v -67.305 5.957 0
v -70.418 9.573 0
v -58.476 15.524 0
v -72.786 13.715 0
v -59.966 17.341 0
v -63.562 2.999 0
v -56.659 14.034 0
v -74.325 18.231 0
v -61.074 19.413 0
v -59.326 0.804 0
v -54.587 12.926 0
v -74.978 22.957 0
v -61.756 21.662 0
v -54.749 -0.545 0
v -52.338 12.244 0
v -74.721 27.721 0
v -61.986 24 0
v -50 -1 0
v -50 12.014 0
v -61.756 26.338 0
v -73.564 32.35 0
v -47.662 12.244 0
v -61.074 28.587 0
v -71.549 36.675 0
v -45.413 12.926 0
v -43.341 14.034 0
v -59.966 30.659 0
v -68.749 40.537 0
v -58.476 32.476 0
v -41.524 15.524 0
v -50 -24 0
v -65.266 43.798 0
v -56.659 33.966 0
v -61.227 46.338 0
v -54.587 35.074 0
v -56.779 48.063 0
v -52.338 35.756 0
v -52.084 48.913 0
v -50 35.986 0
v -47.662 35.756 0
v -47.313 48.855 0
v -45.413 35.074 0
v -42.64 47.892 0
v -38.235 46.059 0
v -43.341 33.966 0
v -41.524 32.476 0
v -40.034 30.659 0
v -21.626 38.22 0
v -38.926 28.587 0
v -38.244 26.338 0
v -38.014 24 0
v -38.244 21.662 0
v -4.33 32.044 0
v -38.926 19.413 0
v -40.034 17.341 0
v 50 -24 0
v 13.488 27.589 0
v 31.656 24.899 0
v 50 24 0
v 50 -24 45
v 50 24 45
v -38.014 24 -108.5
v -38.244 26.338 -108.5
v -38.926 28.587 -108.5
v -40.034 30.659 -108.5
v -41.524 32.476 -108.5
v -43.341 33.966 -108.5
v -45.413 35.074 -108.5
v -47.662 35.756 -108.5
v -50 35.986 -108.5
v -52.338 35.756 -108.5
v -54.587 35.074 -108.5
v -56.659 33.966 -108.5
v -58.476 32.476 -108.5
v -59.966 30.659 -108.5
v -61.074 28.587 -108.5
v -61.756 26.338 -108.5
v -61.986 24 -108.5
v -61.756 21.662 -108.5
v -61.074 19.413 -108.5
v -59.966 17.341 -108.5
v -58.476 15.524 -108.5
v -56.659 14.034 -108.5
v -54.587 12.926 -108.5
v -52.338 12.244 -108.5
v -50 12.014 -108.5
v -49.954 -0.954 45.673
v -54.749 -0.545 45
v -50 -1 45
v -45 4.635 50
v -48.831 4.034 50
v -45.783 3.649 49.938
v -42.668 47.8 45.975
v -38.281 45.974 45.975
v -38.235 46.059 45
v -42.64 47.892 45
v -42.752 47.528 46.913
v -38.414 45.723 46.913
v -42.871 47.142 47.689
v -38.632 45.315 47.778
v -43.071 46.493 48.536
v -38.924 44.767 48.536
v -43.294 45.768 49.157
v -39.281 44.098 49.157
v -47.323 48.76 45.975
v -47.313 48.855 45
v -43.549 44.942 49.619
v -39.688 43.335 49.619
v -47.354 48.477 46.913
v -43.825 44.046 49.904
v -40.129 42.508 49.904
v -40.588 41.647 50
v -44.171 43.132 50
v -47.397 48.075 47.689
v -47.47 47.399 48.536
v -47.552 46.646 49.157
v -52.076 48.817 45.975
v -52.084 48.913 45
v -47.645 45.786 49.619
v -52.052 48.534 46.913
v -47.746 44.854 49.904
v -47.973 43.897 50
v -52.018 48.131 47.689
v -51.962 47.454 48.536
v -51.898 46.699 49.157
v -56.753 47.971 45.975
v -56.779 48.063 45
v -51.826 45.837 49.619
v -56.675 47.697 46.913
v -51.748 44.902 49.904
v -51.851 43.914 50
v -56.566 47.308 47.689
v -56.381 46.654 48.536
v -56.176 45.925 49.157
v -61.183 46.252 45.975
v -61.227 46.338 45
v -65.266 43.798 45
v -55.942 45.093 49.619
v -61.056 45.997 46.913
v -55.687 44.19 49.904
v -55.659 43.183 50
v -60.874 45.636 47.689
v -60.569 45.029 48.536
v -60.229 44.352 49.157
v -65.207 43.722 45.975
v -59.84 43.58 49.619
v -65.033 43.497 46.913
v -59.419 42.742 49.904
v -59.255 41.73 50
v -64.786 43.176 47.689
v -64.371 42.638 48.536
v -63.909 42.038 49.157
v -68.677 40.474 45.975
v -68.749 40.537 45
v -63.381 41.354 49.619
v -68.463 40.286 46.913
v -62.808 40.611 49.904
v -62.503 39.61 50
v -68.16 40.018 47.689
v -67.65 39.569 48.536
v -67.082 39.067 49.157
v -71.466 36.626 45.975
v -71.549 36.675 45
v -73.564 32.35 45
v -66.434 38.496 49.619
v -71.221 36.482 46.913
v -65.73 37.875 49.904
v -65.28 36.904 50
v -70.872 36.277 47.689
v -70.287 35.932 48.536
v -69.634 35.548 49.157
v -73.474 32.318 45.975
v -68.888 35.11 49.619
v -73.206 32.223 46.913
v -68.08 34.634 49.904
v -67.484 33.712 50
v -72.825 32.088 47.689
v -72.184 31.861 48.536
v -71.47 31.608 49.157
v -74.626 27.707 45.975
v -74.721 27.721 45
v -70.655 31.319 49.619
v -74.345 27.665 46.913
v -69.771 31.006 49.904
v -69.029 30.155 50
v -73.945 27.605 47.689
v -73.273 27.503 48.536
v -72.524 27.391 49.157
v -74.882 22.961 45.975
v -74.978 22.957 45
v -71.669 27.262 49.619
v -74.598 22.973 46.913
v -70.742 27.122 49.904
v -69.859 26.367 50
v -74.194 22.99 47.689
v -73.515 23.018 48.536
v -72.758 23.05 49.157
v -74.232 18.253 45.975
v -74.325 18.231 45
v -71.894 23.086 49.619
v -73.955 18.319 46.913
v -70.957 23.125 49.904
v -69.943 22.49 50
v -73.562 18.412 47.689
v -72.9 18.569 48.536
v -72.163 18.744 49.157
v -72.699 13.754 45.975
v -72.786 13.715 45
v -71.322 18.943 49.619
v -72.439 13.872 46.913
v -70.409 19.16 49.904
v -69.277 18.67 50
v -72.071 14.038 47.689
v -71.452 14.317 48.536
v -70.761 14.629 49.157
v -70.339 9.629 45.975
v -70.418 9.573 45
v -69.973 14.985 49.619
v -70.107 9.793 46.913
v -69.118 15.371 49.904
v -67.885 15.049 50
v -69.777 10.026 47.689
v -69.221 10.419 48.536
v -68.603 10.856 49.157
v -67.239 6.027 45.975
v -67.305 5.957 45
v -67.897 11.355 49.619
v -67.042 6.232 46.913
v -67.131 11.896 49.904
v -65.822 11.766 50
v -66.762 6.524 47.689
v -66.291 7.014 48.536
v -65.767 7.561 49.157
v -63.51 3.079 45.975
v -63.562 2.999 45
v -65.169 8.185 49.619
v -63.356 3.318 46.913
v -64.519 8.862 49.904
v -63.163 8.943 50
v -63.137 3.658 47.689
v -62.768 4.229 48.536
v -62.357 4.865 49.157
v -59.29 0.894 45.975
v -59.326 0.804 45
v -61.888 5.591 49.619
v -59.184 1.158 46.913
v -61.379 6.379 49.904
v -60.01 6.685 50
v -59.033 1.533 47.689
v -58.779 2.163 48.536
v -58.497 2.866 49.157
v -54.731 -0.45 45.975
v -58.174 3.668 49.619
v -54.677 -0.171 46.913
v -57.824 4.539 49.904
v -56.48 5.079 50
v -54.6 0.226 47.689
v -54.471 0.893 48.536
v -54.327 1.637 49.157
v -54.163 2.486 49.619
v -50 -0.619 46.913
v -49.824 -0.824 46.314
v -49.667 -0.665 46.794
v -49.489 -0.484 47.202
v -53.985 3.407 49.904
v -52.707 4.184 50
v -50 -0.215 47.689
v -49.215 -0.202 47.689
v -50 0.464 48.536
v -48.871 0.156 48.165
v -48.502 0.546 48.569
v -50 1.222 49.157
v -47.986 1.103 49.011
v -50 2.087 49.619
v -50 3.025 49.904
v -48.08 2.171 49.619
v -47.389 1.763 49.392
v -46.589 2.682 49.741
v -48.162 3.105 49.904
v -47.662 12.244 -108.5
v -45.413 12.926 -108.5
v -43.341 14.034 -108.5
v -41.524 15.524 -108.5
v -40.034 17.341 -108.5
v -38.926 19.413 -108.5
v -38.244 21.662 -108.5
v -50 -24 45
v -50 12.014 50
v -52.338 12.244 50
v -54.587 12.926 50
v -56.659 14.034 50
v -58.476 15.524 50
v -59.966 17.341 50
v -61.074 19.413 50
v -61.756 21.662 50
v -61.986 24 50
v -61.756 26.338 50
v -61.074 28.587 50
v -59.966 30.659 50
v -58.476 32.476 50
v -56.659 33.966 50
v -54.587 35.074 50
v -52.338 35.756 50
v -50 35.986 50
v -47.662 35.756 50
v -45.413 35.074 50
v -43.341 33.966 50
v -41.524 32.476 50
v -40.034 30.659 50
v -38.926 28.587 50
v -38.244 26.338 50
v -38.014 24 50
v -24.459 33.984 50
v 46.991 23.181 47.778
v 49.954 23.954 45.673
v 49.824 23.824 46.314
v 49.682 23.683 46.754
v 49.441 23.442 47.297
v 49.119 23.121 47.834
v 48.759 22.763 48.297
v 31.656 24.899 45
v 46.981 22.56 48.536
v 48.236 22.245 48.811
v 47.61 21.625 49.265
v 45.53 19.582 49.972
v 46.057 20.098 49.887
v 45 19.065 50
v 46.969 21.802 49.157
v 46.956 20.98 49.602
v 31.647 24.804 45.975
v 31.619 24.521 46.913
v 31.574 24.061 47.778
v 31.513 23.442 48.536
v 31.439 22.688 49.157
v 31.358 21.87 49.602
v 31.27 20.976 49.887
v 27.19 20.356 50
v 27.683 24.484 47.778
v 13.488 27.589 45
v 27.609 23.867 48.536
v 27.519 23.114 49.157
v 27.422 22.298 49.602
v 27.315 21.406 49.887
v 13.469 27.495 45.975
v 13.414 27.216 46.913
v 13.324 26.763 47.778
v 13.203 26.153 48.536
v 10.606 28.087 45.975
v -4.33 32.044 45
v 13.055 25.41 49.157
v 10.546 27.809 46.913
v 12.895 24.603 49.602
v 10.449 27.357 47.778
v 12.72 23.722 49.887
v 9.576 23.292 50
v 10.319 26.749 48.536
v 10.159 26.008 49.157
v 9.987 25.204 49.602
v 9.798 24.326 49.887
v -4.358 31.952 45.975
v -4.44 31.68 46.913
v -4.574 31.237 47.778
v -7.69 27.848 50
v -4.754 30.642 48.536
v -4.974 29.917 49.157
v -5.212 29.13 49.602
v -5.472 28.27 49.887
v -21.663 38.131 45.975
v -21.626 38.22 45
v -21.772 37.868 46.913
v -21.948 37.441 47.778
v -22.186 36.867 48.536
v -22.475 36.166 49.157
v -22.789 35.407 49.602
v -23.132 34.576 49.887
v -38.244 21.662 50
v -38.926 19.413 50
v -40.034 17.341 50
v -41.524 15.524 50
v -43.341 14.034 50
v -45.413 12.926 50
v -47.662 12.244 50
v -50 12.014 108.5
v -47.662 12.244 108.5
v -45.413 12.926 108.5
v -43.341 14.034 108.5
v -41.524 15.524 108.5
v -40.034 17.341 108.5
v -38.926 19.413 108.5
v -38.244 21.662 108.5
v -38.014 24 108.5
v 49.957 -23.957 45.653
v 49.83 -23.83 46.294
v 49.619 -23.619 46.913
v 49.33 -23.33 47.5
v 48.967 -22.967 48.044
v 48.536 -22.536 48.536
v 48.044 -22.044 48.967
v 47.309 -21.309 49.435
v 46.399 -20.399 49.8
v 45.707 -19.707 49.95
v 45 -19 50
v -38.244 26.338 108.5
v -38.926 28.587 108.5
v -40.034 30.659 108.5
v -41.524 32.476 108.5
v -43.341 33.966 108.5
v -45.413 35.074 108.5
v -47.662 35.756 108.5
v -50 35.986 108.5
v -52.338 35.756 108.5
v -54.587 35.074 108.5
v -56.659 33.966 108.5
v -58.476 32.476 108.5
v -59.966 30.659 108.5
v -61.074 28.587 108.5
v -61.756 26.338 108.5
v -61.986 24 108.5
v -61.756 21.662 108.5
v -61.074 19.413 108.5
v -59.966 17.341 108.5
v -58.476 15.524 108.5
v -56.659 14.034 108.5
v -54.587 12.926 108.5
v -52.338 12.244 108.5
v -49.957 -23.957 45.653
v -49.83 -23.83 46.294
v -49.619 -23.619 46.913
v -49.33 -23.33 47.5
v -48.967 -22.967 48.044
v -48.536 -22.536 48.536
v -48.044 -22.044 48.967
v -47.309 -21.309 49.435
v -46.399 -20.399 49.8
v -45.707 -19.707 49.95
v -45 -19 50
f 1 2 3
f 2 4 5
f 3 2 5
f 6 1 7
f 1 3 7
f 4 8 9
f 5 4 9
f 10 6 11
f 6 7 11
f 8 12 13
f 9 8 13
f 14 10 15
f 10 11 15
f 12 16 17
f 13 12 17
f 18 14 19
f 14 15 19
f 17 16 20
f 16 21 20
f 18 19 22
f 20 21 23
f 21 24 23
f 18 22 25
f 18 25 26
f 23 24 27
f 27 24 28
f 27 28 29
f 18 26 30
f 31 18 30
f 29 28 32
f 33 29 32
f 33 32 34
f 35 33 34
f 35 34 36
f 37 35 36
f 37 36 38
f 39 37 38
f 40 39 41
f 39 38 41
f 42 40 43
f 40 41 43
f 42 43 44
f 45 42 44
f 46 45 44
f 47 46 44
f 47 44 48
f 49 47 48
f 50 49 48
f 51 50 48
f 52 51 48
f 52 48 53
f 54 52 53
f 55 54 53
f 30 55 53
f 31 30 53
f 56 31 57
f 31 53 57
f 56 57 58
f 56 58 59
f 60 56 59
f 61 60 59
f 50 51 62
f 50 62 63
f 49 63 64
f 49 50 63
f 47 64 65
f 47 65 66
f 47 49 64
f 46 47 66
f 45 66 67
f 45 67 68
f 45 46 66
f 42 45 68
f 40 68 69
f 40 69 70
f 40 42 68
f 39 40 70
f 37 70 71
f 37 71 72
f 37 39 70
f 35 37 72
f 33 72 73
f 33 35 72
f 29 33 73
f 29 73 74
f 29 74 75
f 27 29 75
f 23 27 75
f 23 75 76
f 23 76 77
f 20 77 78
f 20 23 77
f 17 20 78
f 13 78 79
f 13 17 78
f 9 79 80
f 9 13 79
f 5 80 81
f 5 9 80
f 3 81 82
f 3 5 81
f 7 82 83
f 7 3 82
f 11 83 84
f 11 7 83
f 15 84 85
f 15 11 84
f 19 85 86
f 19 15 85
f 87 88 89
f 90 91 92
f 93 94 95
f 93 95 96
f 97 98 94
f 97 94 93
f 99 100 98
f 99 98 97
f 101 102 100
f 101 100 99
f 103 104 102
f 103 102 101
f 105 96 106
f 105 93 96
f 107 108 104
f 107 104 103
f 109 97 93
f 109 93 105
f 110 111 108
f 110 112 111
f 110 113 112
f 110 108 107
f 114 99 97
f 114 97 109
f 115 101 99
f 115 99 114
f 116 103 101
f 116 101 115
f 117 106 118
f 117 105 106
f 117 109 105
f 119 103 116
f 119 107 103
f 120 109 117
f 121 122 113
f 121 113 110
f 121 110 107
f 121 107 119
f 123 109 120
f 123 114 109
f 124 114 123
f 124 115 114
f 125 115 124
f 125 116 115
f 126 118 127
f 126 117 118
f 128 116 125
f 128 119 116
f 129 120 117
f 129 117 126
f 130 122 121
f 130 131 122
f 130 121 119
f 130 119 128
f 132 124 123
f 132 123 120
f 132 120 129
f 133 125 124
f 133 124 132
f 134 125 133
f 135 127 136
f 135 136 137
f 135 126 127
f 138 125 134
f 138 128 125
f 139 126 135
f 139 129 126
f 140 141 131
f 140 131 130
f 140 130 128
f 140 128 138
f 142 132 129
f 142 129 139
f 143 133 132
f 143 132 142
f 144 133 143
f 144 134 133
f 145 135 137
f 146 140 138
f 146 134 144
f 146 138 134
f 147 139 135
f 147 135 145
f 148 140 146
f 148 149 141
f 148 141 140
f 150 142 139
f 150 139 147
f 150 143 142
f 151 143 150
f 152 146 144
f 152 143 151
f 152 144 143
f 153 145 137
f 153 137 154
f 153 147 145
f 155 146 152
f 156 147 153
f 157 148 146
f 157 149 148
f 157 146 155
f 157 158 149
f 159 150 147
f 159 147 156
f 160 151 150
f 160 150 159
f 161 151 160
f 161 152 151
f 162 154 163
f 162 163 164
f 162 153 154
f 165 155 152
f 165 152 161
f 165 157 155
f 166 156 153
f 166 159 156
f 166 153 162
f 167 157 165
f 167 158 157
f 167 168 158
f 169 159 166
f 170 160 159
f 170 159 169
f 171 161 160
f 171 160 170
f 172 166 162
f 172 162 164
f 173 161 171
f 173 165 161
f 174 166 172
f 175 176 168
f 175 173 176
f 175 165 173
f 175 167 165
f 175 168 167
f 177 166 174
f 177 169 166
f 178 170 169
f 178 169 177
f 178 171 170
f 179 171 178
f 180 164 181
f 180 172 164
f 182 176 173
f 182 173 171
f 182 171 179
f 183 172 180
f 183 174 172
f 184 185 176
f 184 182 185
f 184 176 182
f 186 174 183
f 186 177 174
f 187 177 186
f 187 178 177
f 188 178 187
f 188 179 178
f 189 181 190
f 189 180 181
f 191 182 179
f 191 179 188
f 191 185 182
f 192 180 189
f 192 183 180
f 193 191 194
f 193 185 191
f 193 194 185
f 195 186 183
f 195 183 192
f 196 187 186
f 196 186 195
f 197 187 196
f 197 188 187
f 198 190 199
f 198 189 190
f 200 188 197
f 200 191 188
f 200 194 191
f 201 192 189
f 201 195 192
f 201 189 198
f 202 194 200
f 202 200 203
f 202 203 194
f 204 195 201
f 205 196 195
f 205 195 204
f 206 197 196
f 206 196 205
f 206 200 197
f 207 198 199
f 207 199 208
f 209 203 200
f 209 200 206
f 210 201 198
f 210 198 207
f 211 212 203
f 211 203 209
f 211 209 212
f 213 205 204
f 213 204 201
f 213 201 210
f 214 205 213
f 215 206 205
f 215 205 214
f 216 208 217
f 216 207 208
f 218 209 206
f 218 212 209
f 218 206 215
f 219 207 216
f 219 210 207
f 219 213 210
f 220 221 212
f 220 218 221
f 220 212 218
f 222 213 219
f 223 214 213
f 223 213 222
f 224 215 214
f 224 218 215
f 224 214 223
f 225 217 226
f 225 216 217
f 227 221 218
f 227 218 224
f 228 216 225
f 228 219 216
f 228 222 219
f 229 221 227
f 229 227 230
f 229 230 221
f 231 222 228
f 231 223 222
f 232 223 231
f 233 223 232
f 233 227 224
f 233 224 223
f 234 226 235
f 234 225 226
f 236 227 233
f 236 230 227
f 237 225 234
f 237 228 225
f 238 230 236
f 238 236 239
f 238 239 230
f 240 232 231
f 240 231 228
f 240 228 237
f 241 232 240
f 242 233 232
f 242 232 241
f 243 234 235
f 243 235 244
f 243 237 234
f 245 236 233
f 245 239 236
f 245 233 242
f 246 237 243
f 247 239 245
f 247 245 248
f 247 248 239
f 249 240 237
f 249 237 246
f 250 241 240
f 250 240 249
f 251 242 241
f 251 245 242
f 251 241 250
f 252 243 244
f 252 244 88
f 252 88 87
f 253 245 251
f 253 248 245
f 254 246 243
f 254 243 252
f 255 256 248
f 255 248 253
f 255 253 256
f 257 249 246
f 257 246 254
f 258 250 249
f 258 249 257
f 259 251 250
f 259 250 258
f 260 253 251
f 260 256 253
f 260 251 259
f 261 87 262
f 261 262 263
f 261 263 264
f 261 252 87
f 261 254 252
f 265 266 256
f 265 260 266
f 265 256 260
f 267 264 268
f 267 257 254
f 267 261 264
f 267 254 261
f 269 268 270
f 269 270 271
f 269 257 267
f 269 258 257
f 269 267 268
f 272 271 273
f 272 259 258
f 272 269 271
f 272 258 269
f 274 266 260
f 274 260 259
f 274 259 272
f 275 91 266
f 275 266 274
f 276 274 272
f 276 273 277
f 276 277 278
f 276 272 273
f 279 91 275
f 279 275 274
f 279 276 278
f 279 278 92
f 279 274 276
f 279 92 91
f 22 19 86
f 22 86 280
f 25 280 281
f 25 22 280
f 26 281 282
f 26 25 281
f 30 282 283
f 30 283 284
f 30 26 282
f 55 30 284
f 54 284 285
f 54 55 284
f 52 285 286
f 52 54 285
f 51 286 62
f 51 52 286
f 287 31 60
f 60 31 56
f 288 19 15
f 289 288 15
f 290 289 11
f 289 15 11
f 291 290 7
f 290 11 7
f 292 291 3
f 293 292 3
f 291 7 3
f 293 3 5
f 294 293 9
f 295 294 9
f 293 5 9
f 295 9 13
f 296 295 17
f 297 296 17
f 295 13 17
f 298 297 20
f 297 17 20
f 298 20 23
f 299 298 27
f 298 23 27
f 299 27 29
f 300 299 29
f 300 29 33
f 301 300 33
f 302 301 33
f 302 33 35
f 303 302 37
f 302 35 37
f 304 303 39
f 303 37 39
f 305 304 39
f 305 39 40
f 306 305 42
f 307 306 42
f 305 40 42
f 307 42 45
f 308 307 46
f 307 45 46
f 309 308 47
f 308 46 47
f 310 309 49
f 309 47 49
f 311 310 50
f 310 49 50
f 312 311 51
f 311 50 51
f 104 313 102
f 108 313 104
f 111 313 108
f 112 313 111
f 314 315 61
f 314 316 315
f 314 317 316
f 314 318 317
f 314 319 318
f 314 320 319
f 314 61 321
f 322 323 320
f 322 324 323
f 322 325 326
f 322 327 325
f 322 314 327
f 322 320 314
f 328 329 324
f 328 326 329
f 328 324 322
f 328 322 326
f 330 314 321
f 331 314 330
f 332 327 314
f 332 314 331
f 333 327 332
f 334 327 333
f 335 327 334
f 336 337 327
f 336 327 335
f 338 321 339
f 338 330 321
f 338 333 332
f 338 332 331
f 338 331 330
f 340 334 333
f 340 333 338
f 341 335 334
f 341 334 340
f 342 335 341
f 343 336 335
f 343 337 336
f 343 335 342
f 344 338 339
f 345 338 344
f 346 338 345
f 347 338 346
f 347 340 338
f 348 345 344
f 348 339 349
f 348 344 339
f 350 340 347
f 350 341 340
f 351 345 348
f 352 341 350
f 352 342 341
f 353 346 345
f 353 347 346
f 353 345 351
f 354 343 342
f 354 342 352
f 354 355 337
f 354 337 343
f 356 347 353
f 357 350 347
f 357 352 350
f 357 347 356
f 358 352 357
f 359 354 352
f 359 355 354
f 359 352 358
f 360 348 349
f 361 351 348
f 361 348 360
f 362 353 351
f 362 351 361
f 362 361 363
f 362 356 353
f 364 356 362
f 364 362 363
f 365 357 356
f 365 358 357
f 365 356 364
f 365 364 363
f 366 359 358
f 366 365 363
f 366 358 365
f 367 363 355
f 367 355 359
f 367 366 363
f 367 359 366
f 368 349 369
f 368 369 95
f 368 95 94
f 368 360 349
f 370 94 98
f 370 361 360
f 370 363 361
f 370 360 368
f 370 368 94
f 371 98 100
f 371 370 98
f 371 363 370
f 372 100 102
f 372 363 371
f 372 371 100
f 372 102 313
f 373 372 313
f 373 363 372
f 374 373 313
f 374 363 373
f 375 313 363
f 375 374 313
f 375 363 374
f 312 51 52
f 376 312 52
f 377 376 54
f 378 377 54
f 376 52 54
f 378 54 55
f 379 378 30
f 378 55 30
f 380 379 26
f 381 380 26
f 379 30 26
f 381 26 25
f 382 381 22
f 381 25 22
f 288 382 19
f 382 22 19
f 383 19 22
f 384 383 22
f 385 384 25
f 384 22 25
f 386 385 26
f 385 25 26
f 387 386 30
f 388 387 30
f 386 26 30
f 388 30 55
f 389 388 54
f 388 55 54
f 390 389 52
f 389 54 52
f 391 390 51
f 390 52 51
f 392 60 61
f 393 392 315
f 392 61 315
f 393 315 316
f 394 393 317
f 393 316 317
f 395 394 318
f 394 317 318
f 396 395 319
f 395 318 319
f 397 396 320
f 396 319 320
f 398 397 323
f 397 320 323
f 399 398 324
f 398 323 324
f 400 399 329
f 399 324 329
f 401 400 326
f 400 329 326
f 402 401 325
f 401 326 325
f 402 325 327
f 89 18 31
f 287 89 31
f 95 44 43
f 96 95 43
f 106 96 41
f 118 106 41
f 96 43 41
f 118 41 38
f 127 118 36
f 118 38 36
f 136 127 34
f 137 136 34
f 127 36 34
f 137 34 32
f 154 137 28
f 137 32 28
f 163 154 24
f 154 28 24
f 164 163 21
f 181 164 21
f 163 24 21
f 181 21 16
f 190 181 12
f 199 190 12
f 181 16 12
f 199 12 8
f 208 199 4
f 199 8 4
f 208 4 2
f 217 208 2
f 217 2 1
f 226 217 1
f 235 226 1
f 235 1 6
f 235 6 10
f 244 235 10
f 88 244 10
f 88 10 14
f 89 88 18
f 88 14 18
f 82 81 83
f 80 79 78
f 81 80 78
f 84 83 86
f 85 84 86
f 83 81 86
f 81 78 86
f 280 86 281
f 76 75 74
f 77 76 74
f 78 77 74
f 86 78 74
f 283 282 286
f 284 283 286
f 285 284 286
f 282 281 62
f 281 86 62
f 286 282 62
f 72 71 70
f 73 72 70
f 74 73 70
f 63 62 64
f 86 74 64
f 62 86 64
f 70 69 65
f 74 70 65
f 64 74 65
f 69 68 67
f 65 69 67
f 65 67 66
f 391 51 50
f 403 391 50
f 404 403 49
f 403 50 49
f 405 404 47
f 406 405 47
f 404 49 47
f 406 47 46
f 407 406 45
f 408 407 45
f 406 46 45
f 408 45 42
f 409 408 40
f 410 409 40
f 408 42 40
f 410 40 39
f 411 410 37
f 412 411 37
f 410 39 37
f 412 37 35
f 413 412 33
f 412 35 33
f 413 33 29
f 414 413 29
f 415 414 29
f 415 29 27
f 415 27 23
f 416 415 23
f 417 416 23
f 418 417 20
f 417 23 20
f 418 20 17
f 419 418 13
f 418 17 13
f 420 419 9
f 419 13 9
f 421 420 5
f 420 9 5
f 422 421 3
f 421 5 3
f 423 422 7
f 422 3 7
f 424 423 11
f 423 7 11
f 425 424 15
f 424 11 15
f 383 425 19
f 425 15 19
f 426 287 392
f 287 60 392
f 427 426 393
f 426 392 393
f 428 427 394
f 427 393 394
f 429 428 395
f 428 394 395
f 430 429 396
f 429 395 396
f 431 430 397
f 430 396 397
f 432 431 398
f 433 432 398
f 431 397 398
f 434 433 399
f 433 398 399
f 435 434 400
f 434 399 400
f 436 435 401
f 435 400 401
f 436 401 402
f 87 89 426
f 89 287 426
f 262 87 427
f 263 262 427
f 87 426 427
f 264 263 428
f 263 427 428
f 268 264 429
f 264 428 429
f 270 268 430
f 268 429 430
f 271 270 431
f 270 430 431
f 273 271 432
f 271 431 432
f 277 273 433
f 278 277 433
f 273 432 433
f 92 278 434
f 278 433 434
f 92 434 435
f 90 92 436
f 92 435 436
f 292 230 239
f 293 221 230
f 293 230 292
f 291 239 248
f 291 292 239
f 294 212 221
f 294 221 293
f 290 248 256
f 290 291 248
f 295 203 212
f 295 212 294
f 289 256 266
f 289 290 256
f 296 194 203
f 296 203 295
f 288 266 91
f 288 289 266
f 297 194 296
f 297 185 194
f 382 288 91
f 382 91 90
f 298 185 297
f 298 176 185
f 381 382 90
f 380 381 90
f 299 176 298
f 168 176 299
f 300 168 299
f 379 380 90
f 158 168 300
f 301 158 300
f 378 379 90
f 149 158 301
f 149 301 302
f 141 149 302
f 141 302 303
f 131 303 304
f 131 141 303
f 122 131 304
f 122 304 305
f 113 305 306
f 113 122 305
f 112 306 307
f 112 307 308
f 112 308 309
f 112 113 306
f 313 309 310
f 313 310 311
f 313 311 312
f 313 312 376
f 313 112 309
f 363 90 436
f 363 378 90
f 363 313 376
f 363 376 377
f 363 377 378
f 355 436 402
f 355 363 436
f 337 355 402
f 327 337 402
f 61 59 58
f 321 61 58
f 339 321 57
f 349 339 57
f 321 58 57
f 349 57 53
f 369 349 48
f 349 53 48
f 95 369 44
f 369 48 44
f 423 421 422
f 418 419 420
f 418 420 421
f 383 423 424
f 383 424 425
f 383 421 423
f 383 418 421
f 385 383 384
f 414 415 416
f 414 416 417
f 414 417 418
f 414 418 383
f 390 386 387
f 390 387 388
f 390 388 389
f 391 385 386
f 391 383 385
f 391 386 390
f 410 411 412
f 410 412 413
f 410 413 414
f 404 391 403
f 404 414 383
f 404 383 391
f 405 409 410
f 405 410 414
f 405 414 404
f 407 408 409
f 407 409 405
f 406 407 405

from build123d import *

# Parameters (mm, degrees)
F1_DEPTH = 50
F2_DEPTH = 108.5
F3_R     = 5


with BuildPart() as f1:
    # F0 (on Top) → F1 (new body)
    with BuildSketch(Plane.XY):
        with BuildLine():
            ThreePointArc((-38.2352941176, 46.0588235294), (-74.2535625036, 30.0633906259), (-50, -1))
            Line((-50, -1), (-50, 12.0136628569))
            ThreePointArc((-50, 12.0136628569), (-58.4756202755, 32.4756202755), (-38.0136628569, 24))
            Line((-38.0136628569, 24), (-25, 24))
            ThreePointArc((-25, 24), (-28.5626768572, 36.8623938857), (-38.2352941176, 46.0588235294))
        make_face()
        with BuildLine():
            Line((-50, 12.0136628569), (-50, -1))
            ThreePointArc((-50, -1), (-32.3223304703, 6.3223304703), (-25, 24))
            Line((-25, 24), (-38.0136628569, 24))
            ThreePointArc((-38.0136628569, 24), (-41.5243797245, 15.5243797245), (-50, 12.0136628569))
        make_face()
        with BuildLine():
            Line((-50, -24), (50, -24))
            Line((50, -24), (50, 24))
            Line((50, 24), (-25, 24))
            ThreePointArc((-25, 24), (-32.3223304703, 6.3223304703), (-50, -1))
            Line((-50, -1), (-50, -24))
        make_face()
        with BuildLine():
            Line((-25, 24), (50, 24))
            ThreePointArc((50, 24), (4.5245703057, 29.5982812228), (-38.2352941176, 46.0588235294))
            ThreePointArc((-38.2352941176, 46.0588235294), (-28.5626768572, 36.8623938857), (-25, 24))
        make_face()
    extrude(amount=F1_DEPTH)

    # F3
    f3_edges = [f1.edges().sort_by_distance(p)[0] for p in [
        (-74.253563, 30.063391, 50),
        (-50, -12.5, 50),
        (0, -24, 50),
        (50, 0, 50),
    ]]
    fillet(f3_edges, radius=F3_R)


with BuildPart() as f2:
    # F0 (on Top) → F2 (new body, symmetric)
    with BuildSketch(Plane.XY):
        with BuildLine():
            Line((-50, 24), (-50, 12.0136628569))
            ThreePointArc((-50, 12.0136628569), (-41.5243797245, 15.5243797245), (-38.0136628569, 24))
            Line((-38.0136628569, 24), (-50, 24))
        make_face()
        with BuildLine():
            ThreePointArc((-38.0136628569, 24), (-58.4756202755, 32.4756202755), (-50, 12.0136628569))
            Line((-50, 12.0136628569), (-50, 24))
            Line((-50, 24), (-38.0136628569, 24))
        make_face()
    extrude(amount=F2_DEPTH, both=True)


solid = Compound([f1.part, f2.part])
